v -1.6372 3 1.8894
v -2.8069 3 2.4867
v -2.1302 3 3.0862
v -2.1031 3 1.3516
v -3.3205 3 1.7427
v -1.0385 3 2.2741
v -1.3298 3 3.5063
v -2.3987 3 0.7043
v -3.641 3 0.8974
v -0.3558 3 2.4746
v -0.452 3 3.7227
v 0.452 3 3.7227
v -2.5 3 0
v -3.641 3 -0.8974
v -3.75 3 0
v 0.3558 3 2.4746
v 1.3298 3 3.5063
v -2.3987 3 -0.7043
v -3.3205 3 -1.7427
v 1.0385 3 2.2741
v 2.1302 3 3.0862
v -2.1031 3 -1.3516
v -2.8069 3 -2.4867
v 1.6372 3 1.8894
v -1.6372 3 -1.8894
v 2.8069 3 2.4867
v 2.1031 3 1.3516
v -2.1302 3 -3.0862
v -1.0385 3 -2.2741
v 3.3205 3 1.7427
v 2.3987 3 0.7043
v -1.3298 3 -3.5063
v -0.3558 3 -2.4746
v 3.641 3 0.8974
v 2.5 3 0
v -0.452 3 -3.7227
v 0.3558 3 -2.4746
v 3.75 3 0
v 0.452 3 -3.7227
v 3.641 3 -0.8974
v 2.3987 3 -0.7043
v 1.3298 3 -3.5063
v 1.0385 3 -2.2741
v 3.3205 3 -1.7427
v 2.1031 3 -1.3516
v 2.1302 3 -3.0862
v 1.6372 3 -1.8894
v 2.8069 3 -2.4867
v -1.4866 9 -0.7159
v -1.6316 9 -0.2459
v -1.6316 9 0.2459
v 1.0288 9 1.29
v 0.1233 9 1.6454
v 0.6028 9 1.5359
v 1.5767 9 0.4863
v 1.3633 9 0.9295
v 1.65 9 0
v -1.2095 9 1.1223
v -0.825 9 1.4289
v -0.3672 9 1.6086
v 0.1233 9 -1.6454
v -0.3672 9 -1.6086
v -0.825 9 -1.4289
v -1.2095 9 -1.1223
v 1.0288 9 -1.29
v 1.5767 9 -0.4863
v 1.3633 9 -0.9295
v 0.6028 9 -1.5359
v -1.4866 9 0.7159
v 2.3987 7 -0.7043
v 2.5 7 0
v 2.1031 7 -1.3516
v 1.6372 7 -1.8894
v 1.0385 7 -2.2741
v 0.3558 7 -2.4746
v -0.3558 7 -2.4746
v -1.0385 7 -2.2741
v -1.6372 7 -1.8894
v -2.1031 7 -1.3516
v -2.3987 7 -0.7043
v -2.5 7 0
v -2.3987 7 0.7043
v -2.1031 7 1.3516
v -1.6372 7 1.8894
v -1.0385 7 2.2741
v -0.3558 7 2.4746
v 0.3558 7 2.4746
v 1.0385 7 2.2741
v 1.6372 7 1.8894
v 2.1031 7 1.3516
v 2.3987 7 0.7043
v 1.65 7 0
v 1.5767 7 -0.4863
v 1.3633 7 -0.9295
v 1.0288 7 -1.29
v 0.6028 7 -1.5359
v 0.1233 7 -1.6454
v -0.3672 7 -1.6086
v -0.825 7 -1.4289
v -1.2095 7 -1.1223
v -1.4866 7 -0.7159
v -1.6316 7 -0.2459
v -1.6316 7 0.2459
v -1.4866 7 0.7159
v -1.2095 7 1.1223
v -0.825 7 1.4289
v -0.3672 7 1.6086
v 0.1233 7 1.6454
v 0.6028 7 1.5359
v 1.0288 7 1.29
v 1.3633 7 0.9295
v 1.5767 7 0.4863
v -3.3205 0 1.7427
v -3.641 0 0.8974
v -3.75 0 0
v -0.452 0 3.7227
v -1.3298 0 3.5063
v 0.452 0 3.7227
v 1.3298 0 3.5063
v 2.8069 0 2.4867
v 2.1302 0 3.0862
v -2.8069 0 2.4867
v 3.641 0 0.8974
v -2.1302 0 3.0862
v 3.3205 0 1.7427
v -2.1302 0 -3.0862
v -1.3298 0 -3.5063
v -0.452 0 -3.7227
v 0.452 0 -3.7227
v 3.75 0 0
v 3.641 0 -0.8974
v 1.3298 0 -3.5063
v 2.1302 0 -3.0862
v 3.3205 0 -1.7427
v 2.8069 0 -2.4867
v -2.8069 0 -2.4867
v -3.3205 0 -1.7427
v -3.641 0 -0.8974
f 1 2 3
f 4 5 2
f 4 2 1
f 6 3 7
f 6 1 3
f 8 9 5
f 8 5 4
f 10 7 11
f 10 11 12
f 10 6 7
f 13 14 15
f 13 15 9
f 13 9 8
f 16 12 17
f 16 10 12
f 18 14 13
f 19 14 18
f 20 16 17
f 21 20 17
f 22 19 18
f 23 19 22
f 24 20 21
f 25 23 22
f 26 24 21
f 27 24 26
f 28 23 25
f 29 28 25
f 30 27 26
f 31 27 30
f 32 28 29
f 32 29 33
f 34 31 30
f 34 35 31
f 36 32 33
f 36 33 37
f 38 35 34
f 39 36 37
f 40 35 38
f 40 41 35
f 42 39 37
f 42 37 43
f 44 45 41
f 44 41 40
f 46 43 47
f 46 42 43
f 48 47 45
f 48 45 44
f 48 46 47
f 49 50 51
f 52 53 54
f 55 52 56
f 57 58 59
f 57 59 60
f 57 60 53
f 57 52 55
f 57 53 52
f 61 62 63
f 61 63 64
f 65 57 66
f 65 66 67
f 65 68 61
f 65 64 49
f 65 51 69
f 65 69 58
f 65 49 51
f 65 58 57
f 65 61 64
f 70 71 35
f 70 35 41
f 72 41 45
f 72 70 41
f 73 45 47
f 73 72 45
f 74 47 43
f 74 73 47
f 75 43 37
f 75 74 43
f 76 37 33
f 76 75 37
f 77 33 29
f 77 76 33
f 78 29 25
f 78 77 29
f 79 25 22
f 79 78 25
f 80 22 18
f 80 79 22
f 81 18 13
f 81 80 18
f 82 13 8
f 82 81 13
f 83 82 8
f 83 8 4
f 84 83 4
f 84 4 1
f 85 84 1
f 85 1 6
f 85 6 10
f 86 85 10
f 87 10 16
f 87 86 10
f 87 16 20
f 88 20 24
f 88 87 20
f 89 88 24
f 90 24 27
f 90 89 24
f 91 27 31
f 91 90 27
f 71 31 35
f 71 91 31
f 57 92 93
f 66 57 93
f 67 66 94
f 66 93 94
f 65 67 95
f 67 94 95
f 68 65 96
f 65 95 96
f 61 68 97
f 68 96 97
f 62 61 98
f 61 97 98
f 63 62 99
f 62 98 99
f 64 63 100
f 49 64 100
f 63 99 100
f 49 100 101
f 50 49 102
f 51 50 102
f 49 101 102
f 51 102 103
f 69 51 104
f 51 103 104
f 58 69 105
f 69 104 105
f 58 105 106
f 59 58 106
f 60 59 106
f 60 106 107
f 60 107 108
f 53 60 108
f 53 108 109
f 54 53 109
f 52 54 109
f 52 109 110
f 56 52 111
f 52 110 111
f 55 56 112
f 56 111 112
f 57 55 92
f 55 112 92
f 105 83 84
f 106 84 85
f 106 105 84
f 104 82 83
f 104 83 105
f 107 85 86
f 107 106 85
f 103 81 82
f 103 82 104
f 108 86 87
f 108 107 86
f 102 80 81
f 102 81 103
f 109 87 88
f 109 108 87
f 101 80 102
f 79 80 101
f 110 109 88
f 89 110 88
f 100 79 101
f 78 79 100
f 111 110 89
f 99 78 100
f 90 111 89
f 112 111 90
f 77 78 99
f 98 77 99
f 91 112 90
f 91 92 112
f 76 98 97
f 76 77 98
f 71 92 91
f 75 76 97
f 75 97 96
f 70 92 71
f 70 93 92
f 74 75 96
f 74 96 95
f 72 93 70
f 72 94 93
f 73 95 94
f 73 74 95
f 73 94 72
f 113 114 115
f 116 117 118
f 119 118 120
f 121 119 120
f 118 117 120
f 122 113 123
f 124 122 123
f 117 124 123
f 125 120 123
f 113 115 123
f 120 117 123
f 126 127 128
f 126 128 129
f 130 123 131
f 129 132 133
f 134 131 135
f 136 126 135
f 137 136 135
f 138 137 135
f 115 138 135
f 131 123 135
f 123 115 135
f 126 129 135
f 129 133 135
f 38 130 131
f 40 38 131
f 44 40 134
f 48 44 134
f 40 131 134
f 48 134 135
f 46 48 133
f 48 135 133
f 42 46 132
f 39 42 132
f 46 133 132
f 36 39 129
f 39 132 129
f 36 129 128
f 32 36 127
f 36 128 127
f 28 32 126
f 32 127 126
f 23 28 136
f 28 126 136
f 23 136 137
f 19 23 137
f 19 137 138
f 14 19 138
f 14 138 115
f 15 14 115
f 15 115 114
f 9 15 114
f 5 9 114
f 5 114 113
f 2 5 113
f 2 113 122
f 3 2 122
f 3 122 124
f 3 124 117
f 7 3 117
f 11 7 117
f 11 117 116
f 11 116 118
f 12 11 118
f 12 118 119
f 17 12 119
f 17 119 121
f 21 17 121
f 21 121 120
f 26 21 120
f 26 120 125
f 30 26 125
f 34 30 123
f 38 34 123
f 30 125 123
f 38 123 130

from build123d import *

# Parameters (mm, degrees)
SKETCH1_R           = 3.75
BOSS_EXTRUDE1_DEPTH = 7
SKETCH2_R           = 3.75
SKETCH2_R_2         = 2.5
CUT_EXTRUDE1_DEPTH  = 4
SKETCH3_R           = 1.65
BOSS_EXTRUDE2_DEPTH = 2


with BuildPart() as part:
    # Sketch1 → Boss-Extrude1 (new body)
    with BuildSketch(Plane(origin=(0, 0, 0), x_dir=(1, 0, 0), z_dir=(0, 1, 0))):
        Circle(SKETCH1_R)
    extrude(amount=BOSS_EXTRUDE1_DEPTH)

    # Sketch2 → Cut-Extrude1 (cut)
    with BuildSketch(Plane(origin=(0, 7, 0), x_dir=(1, 0, 0), z_dir=(0, 1, 0))):
        Circle(SKETCH2_R)
        Circle(SKETCH2_R_2, mode=Mode.SUBTRACT)
    extrude(amount=-CUT_EXTRUDE1_DEPTH, mode=Mode.SUBTRACT)

    # Sketch3 → Boss-Extrude2 (add)
    with BuildSketch(Plane(origin=(0, 7, 0), x_dir=(1, 0, 0), z_dir=(0, 1, 0))):
        Circle(SKETCH3_R)
    extrude(amount=BOSS_EXTRUDE2_DEPTH)


solid = part.part
